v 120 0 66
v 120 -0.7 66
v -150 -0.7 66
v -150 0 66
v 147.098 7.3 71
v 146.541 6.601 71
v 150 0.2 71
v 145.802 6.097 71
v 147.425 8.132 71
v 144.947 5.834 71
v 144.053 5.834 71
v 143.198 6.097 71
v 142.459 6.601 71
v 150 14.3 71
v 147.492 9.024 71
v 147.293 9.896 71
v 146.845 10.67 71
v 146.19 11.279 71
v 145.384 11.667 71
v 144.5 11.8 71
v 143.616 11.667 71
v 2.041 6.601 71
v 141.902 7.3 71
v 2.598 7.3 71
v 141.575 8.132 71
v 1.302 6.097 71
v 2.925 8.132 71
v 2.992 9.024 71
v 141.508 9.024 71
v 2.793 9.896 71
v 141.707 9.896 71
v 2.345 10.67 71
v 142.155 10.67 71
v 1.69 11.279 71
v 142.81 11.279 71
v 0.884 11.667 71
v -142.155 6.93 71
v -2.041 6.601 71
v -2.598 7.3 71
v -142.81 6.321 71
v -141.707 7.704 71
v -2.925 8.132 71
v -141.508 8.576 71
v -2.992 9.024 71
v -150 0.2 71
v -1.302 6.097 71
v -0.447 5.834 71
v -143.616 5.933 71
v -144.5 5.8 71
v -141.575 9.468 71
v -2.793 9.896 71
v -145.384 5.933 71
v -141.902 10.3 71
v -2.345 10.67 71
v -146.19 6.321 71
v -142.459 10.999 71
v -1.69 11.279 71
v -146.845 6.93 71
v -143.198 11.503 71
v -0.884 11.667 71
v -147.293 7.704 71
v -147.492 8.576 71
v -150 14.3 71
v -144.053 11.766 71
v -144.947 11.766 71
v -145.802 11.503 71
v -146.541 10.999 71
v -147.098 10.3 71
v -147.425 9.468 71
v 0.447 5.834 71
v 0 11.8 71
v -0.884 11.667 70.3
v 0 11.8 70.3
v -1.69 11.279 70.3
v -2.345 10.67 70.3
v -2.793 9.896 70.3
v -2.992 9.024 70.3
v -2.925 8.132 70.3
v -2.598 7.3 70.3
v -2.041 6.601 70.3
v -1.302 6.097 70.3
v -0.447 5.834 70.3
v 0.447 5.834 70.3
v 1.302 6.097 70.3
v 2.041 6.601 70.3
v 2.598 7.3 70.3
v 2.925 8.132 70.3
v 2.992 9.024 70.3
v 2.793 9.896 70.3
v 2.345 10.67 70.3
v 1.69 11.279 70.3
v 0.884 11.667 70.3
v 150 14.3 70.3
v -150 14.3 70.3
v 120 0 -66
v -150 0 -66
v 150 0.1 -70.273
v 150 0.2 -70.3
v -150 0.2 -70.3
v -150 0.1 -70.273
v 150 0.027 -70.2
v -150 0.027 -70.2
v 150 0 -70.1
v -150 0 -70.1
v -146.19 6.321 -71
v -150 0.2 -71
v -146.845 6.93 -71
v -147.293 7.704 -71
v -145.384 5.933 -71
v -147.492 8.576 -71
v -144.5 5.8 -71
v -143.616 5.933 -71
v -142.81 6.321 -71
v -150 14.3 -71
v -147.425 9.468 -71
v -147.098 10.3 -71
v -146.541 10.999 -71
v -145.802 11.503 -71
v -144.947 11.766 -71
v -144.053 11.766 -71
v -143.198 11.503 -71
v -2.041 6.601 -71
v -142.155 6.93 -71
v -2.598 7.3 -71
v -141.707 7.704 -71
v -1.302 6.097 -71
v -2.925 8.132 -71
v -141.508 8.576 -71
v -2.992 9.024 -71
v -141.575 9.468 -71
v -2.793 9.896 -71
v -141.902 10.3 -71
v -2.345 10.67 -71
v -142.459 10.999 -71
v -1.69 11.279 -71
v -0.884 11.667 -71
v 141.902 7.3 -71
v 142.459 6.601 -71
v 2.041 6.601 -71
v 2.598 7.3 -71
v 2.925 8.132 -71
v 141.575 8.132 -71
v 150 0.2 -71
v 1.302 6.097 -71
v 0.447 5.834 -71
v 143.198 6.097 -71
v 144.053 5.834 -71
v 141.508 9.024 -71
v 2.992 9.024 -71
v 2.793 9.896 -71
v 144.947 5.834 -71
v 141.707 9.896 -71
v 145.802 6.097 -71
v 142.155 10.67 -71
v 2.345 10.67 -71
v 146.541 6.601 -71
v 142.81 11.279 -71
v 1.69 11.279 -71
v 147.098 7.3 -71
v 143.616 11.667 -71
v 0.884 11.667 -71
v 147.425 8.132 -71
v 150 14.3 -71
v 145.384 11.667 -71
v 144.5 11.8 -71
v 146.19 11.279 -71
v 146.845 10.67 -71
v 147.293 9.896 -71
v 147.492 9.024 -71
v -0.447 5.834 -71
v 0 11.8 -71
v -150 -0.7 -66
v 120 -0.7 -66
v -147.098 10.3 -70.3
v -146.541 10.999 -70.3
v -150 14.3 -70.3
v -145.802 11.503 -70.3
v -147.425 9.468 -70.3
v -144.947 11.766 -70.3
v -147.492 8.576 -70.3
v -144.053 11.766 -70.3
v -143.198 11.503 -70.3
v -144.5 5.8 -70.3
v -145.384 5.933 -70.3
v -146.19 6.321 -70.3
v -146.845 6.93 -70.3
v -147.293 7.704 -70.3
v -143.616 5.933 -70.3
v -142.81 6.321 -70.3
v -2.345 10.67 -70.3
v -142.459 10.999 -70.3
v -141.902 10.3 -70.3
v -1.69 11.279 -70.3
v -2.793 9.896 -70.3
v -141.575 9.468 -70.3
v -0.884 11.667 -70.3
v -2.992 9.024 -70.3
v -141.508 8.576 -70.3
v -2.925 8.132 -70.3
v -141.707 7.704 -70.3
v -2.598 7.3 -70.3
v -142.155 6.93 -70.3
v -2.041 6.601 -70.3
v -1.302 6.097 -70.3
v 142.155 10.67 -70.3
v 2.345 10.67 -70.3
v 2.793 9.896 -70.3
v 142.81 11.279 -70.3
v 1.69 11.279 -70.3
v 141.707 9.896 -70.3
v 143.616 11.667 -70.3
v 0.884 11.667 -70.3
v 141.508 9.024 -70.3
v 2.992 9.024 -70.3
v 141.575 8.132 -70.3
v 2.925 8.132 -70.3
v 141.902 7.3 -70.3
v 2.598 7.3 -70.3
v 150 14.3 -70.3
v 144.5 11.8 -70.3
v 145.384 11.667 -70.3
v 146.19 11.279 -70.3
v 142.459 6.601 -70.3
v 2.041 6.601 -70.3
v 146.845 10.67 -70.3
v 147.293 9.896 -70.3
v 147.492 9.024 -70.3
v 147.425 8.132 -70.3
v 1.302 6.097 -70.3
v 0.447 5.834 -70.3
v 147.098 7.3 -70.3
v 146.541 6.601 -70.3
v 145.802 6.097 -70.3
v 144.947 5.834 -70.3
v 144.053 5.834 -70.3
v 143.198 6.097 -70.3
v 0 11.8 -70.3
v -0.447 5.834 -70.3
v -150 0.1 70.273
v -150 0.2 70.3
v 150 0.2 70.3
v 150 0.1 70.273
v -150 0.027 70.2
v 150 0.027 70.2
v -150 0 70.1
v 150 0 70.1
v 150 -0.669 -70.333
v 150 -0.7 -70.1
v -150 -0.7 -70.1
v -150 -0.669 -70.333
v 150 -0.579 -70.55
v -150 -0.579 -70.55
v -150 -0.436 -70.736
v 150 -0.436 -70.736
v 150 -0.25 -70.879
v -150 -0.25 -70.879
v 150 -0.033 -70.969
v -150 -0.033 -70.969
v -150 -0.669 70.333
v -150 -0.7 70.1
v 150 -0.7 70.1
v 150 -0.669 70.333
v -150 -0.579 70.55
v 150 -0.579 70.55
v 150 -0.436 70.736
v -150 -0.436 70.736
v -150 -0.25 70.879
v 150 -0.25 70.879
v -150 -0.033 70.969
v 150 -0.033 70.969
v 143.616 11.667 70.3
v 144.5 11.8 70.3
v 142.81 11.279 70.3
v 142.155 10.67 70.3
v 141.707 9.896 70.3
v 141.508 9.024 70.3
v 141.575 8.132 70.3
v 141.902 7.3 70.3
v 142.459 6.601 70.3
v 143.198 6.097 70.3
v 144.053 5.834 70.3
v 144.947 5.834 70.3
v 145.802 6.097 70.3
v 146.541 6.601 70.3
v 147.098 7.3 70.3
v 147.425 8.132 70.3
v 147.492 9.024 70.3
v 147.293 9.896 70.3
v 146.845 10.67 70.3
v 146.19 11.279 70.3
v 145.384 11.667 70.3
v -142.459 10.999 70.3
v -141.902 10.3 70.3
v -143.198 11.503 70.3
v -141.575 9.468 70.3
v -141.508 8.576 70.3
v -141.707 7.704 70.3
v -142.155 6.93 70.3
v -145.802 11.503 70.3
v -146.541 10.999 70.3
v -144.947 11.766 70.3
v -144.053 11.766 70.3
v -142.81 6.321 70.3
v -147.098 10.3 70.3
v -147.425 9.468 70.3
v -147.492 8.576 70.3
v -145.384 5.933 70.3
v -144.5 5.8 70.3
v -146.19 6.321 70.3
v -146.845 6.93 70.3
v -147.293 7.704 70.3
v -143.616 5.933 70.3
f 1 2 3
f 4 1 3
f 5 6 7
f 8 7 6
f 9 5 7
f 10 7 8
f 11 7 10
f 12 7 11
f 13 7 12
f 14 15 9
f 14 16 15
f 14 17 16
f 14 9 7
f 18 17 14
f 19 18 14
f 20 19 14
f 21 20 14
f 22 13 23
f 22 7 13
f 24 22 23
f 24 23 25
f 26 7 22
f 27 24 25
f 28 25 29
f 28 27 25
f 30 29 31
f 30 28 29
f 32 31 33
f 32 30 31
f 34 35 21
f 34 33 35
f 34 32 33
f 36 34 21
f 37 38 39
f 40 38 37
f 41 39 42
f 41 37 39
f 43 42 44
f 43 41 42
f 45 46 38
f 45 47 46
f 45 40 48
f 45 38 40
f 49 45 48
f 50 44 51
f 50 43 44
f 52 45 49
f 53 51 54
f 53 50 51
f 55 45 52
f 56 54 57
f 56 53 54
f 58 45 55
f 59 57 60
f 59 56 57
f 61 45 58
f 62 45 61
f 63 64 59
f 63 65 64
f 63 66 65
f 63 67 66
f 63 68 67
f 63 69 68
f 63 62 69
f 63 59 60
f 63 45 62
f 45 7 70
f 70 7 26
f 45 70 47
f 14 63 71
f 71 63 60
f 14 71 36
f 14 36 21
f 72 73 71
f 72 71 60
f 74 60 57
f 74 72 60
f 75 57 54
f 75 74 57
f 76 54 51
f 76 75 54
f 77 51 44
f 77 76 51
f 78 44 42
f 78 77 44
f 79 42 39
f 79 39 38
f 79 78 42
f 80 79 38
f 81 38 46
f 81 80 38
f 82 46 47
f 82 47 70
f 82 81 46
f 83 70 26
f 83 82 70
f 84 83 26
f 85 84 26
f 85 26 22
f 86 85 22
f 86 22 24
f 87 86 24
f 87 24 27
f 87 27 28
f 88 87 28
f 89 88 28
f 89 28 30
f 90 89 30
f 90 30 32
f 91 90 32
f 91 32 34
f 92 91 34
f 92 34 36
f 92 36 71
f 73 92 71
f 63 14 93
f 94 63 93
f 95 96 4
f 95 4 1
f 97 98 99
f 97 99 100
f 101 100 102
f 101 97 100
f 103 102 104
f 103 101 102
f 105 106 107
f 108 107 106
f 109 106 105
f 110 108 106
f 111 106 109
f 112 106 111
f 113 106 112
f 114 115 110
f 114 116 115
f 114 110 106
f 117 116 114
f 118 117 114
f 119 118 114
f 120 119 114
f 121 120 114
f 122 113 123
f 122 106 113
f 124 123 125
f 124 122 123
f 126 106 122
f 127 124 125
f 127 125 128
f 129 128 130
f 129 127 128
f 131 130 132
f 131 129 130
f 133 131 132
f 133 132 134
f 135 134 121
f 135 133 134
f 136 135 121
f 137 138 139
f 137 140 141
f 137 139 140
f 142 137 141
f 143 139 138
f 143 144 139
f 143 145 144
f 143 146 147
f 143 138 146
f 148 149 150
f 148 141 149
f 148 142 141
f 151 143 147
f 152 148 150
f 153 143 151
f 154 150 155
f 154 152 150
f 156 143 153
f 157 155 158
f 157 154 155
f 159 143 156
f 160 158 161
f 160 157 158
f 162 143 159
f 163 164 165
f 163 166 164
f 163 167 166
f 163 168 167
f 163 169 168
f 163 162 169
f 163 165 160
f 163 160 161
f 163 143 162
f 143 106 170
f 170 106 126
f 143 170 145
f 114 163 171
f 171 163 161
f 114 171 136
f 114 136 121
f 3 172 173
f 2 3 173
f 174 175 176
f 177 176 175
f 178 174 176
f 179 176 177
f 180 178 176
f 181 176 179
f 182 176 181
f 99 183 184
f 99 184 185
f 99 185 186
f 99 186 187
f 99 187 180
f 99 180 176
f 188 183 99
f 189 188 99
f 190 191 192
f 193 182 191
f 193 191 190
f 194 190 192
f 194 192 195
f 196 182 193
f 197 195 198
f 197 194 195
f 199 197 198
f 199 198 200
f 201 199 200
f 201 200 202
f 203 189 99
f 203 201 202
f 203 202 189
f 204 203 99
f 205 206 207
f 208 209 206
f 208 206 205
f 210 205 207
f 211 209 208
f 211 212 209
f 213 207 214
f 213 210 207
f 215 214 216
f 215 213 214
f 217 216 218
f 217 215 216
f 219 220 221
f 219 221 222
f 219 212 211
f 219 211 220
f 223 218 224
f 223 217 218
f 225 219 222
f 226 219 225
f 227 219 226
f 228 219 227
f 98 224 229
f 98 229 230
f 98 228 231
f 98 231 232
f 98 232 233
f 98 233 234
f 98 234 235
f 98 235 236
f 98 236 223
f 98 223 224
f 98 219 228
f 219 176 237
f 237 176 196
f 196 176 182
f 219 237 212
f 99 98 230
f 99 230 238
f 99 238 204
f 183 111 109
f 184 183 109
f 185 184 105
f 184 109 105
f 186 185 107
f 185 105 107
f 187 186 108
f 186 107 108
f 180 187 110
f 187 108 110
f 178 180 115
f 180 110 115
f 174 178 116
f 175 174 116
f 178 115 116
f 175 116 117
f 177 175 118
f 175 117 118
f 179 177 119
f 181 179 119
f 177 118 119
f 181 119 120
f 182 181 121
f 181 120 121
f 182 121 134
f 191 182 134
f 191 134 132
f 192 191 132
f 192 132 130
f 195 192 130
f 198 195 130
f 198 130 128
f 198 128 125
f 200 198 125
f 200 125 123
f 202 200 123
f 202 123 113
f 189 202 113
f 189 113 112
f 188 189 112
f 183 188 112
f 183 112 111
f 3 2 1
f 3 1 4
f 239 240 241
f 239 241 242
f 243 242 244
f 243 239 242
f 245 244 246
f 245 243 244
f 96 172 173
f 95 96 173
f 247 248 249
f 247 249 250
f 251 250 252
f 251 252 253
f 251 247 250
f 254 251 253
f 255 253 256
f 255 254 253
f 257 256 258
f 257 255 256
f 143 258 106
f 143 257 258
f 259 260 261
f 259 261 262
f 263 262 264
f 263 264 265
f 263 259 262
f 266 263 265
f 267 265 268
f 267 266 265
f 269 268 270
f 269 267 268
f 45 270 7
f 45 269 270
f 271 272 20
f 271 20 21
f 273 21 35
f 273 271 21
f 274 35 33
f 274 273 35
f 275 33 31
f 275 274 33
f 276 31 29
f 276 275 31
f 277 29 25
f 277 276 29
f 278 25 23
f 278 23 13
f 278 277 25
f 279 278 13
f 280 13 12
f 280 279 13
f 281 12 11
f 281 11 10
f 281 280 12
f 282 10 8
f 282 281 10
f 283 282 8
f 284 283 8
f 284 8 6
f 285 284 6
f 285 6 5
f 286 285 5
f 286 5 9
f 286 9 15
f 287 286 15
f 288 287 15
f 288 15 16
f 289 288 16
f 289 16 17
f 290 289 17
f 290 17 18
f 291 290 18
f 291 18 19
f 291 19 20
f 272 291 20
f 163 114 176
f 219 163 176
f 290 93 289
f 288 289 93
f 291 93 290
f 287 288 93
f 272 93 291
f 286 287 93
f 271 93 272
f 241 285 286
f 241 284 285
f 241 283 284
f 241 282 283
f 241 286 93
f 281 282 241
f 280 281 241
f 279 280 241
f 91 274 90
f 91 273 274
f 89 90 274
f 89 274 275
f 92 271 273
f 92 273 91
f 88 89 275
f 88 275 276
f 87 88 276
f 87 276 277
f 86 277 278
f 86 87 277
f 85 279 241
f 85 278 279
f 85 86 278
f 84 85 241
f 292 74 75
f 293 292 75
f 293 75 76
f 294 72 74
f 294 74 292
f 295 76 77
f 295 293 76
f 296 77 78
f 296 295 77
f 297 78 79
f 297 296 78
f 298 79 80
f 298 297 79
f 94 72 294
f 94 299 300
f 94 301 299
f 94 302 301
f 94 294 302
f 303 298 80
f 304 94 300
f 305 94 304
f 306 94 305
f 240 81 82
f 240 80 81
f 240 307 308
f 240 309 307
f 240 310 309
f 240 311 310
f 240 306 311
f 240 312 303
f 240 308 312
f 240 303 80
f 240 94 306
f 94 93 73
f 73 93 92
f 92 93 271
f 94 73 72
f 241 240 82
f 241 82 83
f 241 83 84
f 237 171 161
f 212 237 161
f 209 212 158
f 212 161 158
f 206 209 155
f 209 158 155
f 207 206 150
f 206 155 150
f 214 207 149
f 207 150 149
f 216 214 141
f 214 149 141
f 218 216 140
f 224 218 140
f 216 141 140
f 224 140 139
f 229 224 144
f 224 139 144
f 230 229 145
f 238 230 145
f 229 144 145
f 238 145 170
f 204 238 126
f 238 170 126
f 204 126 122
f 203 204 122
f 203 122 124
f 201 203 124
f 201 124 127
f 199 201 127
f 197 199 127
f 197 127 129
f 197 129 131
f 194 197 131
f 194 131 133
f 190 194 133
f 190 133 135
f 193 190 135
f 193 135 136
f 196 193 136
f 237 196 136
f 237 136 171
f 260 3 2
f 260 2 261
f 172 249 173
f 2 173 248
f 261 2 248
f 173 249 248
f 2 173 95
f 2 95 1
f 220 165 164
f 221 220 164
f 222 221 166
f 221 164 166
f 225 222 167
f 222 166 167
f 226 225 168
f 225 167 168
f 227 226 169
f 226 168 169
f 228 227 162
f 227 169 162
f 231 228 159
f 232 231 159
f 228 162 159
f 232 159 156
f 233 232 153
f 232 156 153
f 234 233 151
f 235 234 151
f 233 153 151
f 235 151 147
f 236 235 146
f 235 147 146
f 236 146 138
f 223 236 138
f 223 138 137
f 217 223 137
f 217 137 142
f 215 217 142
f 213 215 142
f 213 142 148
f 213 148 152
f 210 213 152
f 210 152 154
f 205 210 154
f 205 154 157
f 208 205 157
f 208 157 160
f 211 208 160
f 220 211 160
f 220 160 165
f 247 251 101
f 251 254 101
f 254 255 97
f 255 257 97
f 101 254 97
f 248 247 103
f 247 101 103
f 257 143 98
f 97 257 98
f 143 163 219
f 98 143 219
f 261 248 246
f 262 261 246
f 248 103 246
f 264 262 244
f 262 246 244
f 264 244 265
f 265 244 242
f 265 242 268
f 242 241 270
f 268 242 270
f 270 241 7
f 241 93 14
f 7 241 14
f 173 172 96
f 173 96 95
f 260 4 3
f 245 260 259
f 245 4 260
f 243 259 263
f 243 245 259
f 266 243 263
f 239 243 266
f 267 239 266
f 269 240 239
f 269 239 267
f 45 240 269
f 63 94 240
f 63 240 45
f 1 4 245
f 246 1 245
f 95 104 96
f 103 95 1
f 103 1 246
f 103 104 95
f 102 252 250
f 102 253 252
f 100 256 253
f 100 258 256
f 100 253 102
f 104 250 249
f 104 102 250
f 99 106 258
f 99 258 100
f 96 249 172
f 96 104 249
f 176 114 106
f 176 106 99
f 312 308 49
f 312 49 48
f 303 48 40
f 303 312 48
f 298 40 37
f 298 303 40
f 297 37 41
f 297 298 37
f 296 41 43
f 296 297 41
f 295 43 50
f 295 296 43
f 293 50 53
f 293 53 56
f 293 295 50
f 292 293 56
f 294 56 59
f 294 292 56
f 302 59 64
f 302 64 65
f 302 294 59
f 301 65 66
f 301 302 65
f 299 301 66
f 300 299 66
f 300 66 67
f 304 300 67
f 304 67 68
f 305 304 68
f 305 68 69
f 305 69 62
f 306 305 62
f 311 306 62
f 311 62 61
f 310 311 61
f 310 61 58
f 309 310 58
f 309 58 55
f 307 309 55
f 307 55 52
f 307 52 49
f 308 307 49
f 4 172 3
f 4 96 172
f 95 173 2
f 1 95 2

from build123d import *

# Parameters (mm, degrees)
SKETCH_1_W                         = 300
SKETCH_1_H                         = 142
SM_BASE_FLANGE_1_DEPTH             = 0.7
SM_EDGE_FLANGE_1_STRIP_W           = 3.2
SM_EDGE_FLANGE_1_STRIP_H           = 0.7
SM_EDGE_FLANGE_1_STRIP_CUT_DEPTH   = 300
SM_EDGE_FLANGE_1_STRIP_2_W         = 3.2
SM_EDGE_FLANGE_1_STRIP_2_H         = 0.7
SM_EDGE_FLANGE_1_STRIP_CUT_2_DEPTH = 300
SM_EDGE_FLANGE_1_DEPTH             = 300
SM_EDGE_FLANGE_1_BEND_DEPTH        = 300
SKETCH_18_R                        = 3
CUT_EXTRUDE_1_DEPTH                = 10
CUT_EXTRUDE_START                  = -10
SKETCH_20_R                        = 3
CUT_EXTRUDE_2_DEPTH                = 10
SPLIT_BODIES_1_SURFACE_1_BACK      = 333.248
SPLIT_BODIES_1_SURFACE_1_DEPTH     = 666.496
SPLIT_BODIES_1_SURFACE_2_BACK      = 333.248
SPLIT_BODIES_1_SURFACE_2_DEPTH     = 666.496


# Sheet-metal steps are written as plain solids
with BuildPart() as part:
    # 草图1 → 基体-法兰1 (new body)
    with BuildSketch(Plane(origin=(0, 0, 0), x_dir=(1, 0, 0), z_dir=(0, 1, 0))):
        Rectangle(SKETCH_1_W, SKETCH_1_H)
    extrude(amount=-SM_BASE_FLANGE_1_DEPTH)

    # 边线-法兰1 strip (across the edge) → 边线-法兰1 strip cut (cut)
    with BuildSketch(Plane(origin=(150, 0, -71), x_dir=(0, 0, 1), z_dir=(-1, 0, 0))):
        with Locations((-0.7, -0.35)):
            Rectangle(SM_EDGE_FLANGE_1_STRIP_W, SM_EDGE_FLANGE_1_STRIP_H)
    extrude(amount=SM_EDGE_FLANGE_1_STRIP_CUT_DEPTH, mode=Mode.SUBTRACT)

    # 边线-法兰1 strip 2 (across the edge) → 边线-法兰1 strip cut 2 (cut)
    with BuildSketch(Plane(origin=(-150, 0, 71), x_dir=(0, 0, -1), z_dir=(1, 0, 0))):
        with Locations((-0.7, -0.35)):
            Rectangle(SM_EDGE_FLANGE_1_STRIP_2_W, SM_EDGE_FLANGE_1_STRIP_2_H)
    extrude(amount=SM_EDGE_FLANGE_1_STRIP_CUT_2_DEPTH, mode=Mode.SUBTRACT)

    # 边线-法兰1 section (across the edge) → 边线-法兰1 (add)
    with BuildSketch(Plane(origin=(150, 0, -71), x_dir=(0, 0, 1), z_dir=(-1, 0, 0))):
        with BuildLine():
            Line((0, 0.2), (0, 14.3))
            Line((0, 14.3), (0.7, 14.3))
            Line((0.7, 14.3), (0.7, 0.2))
            ThreePointArc((0.7, 0.2), (0.758578644, 0.058578644), (0.9, 0))
            Line((0.9, 0), (0.9, -0.7))
            ThreePointArc((0.9, -0.7), (0.263603897, -0.436396103), (0, 0.2))
        make_face()
    extrude(amount=SM_EDGE_FLANGE_1_DEPTH)

    # 边线-法兰1 section 2 (across the edge) → 边线-法兰1 bend (add)
    with BuildSketch(Plane(origin=(-150, 0, 71), x_dir=(0, 0, -1), z_dir=(1, 0, 0))):
        with BuildLine():
            Line((0, 0.2), (0, 14.3))
            Line((0, 14.3), (0.7, 14.3))
            Line((0.7, 14.3), (0.7, 0.2))
            ThreePointArc((0.7, 0.2), (0.758578644, 0.058578644), (0.9, 0))
            Line((0.9, 0), (0.9, -0.7))
            ThreePointArc((0.9, -0.7), (0.263603897, -0.436396103), (0, 0.2))
        make_face()
    extrude(amount=SM_EDGE_FLANGE_1_BEND_DEPTH)

    # 草图18 → 切除-拉伸1 (cut)
    with BuildSketch(Plane(origin=(0, 0, -71), x_dir=(-1, 0, 0), z_dir=(0, 0, -1))):
        with Locations(Location((-144.5, 8.8, 0), (0, 0, 90))):
            Circle(SKETCH_18_R)
        with Locations(Location((0, 8.8, 0), (0, 0, 90))):
            Circle(SKETCH_18_R)
        with Locations(Location((144.5, 8.8, 0), (0, 0, 270))):
            Circle(SKETCH_18_R)
    extrude(amount=-CUT_EXTRUDE_1_DEPTH, mode=Mode.SUBTRACT)

    # 草图20 → 切除-拉伸2 (cut)
    with BuildSketch(Plane.XY.offset(71).offset(CUT_EXTRUDE_START)):
        with Locations(Location((-144.5, 8.8, 0), (0, 0, 270))):
            Circle(SKETCH_20_R)
        with Locations(Location((0, 8.8, 0), (0, 0, 90))):
            Circle(SKETCH_20_R)
        with Locations(Location((144.5, 8.8, 0), (0, 0, 90))):
            Circle(SKETCH_20_R)
    extrude(amount=CUT_EXTRUDE_2_DEPTH, mode=Mode.SUBTRACT)


with BuildPart() as body_2:
    # Split Bodies 1: the piece behind the surface
    add(part.part)
    # Split Bodies 1 surface: a surface, the sketch's curves swept straight by 666.496 mm
    with BuildLine(Plane(origin=(0, 0, 0), x_dir=(1, 0, 0), z_dir=(0, 1, 0)).offset(-SPLIT_BODIES_1_SURFACE_1_BACK), mode=Mode.PRIVATE) as split_bodies_1_surface_1_path:
        Line((-150, 66), (120, 66))
        Line((120, 66), (120, -66))
        Line((120, -66), (-150, -66))
    split_bodies_1_surface_1 = Shell.extrude(split_bodies_1_surface_1_path.wire(), (0 * SPLIT_BODIES_1_SURFACE_1_DEPTH, 1 * SPLIT_BODIES_1_SURFACE_1_DEPTH, 0 * SPLIT_BODIES_1_SURFACE_1_DEPTH))
    split(bisect_by=split_bodies_1_surface_1, keep=Keep.BOTTOM)


with BuildPart() as part_1:
    add(part.part)

    # Split Bodies 1: split by a surface, the side it looks to stays
    # Split Bodies 1 surface: a surface, the sketch's curves swept straight by 666.496 mm
    with BuildLine(Plane(origin=(0, 0, 0), x_dir=(1, 0, 0), z_dir=(0, 1, 0)).offset(-SPLIT_BODIES_1_SURFACE_2_BACK), mode=Mode.PRIVATE) as split_bodies_1_surface_2_path:
        Line((-150, 66), (120, 66))
        Line((120, 66), (120, -66))
        Line((120, -66), (-150, -66))
    split_bodies_1_surface_2 = Shell.extrude(split_bodies_1_surface_2_path.wire(), (0 * SPLIT_BODIES_1_SURFACE_2_DEPTH, 1 * SPLIT_BODIES_1_SURFACE_2_DEPTH, 0 * SPLIT_BODIES_1_SURFACE_2_DEPTH))
    split(bisect_by=split_bodies_1_surface_2, keep=Keep.TOP)


solid = Compound([body_2.part, part_1.part])
